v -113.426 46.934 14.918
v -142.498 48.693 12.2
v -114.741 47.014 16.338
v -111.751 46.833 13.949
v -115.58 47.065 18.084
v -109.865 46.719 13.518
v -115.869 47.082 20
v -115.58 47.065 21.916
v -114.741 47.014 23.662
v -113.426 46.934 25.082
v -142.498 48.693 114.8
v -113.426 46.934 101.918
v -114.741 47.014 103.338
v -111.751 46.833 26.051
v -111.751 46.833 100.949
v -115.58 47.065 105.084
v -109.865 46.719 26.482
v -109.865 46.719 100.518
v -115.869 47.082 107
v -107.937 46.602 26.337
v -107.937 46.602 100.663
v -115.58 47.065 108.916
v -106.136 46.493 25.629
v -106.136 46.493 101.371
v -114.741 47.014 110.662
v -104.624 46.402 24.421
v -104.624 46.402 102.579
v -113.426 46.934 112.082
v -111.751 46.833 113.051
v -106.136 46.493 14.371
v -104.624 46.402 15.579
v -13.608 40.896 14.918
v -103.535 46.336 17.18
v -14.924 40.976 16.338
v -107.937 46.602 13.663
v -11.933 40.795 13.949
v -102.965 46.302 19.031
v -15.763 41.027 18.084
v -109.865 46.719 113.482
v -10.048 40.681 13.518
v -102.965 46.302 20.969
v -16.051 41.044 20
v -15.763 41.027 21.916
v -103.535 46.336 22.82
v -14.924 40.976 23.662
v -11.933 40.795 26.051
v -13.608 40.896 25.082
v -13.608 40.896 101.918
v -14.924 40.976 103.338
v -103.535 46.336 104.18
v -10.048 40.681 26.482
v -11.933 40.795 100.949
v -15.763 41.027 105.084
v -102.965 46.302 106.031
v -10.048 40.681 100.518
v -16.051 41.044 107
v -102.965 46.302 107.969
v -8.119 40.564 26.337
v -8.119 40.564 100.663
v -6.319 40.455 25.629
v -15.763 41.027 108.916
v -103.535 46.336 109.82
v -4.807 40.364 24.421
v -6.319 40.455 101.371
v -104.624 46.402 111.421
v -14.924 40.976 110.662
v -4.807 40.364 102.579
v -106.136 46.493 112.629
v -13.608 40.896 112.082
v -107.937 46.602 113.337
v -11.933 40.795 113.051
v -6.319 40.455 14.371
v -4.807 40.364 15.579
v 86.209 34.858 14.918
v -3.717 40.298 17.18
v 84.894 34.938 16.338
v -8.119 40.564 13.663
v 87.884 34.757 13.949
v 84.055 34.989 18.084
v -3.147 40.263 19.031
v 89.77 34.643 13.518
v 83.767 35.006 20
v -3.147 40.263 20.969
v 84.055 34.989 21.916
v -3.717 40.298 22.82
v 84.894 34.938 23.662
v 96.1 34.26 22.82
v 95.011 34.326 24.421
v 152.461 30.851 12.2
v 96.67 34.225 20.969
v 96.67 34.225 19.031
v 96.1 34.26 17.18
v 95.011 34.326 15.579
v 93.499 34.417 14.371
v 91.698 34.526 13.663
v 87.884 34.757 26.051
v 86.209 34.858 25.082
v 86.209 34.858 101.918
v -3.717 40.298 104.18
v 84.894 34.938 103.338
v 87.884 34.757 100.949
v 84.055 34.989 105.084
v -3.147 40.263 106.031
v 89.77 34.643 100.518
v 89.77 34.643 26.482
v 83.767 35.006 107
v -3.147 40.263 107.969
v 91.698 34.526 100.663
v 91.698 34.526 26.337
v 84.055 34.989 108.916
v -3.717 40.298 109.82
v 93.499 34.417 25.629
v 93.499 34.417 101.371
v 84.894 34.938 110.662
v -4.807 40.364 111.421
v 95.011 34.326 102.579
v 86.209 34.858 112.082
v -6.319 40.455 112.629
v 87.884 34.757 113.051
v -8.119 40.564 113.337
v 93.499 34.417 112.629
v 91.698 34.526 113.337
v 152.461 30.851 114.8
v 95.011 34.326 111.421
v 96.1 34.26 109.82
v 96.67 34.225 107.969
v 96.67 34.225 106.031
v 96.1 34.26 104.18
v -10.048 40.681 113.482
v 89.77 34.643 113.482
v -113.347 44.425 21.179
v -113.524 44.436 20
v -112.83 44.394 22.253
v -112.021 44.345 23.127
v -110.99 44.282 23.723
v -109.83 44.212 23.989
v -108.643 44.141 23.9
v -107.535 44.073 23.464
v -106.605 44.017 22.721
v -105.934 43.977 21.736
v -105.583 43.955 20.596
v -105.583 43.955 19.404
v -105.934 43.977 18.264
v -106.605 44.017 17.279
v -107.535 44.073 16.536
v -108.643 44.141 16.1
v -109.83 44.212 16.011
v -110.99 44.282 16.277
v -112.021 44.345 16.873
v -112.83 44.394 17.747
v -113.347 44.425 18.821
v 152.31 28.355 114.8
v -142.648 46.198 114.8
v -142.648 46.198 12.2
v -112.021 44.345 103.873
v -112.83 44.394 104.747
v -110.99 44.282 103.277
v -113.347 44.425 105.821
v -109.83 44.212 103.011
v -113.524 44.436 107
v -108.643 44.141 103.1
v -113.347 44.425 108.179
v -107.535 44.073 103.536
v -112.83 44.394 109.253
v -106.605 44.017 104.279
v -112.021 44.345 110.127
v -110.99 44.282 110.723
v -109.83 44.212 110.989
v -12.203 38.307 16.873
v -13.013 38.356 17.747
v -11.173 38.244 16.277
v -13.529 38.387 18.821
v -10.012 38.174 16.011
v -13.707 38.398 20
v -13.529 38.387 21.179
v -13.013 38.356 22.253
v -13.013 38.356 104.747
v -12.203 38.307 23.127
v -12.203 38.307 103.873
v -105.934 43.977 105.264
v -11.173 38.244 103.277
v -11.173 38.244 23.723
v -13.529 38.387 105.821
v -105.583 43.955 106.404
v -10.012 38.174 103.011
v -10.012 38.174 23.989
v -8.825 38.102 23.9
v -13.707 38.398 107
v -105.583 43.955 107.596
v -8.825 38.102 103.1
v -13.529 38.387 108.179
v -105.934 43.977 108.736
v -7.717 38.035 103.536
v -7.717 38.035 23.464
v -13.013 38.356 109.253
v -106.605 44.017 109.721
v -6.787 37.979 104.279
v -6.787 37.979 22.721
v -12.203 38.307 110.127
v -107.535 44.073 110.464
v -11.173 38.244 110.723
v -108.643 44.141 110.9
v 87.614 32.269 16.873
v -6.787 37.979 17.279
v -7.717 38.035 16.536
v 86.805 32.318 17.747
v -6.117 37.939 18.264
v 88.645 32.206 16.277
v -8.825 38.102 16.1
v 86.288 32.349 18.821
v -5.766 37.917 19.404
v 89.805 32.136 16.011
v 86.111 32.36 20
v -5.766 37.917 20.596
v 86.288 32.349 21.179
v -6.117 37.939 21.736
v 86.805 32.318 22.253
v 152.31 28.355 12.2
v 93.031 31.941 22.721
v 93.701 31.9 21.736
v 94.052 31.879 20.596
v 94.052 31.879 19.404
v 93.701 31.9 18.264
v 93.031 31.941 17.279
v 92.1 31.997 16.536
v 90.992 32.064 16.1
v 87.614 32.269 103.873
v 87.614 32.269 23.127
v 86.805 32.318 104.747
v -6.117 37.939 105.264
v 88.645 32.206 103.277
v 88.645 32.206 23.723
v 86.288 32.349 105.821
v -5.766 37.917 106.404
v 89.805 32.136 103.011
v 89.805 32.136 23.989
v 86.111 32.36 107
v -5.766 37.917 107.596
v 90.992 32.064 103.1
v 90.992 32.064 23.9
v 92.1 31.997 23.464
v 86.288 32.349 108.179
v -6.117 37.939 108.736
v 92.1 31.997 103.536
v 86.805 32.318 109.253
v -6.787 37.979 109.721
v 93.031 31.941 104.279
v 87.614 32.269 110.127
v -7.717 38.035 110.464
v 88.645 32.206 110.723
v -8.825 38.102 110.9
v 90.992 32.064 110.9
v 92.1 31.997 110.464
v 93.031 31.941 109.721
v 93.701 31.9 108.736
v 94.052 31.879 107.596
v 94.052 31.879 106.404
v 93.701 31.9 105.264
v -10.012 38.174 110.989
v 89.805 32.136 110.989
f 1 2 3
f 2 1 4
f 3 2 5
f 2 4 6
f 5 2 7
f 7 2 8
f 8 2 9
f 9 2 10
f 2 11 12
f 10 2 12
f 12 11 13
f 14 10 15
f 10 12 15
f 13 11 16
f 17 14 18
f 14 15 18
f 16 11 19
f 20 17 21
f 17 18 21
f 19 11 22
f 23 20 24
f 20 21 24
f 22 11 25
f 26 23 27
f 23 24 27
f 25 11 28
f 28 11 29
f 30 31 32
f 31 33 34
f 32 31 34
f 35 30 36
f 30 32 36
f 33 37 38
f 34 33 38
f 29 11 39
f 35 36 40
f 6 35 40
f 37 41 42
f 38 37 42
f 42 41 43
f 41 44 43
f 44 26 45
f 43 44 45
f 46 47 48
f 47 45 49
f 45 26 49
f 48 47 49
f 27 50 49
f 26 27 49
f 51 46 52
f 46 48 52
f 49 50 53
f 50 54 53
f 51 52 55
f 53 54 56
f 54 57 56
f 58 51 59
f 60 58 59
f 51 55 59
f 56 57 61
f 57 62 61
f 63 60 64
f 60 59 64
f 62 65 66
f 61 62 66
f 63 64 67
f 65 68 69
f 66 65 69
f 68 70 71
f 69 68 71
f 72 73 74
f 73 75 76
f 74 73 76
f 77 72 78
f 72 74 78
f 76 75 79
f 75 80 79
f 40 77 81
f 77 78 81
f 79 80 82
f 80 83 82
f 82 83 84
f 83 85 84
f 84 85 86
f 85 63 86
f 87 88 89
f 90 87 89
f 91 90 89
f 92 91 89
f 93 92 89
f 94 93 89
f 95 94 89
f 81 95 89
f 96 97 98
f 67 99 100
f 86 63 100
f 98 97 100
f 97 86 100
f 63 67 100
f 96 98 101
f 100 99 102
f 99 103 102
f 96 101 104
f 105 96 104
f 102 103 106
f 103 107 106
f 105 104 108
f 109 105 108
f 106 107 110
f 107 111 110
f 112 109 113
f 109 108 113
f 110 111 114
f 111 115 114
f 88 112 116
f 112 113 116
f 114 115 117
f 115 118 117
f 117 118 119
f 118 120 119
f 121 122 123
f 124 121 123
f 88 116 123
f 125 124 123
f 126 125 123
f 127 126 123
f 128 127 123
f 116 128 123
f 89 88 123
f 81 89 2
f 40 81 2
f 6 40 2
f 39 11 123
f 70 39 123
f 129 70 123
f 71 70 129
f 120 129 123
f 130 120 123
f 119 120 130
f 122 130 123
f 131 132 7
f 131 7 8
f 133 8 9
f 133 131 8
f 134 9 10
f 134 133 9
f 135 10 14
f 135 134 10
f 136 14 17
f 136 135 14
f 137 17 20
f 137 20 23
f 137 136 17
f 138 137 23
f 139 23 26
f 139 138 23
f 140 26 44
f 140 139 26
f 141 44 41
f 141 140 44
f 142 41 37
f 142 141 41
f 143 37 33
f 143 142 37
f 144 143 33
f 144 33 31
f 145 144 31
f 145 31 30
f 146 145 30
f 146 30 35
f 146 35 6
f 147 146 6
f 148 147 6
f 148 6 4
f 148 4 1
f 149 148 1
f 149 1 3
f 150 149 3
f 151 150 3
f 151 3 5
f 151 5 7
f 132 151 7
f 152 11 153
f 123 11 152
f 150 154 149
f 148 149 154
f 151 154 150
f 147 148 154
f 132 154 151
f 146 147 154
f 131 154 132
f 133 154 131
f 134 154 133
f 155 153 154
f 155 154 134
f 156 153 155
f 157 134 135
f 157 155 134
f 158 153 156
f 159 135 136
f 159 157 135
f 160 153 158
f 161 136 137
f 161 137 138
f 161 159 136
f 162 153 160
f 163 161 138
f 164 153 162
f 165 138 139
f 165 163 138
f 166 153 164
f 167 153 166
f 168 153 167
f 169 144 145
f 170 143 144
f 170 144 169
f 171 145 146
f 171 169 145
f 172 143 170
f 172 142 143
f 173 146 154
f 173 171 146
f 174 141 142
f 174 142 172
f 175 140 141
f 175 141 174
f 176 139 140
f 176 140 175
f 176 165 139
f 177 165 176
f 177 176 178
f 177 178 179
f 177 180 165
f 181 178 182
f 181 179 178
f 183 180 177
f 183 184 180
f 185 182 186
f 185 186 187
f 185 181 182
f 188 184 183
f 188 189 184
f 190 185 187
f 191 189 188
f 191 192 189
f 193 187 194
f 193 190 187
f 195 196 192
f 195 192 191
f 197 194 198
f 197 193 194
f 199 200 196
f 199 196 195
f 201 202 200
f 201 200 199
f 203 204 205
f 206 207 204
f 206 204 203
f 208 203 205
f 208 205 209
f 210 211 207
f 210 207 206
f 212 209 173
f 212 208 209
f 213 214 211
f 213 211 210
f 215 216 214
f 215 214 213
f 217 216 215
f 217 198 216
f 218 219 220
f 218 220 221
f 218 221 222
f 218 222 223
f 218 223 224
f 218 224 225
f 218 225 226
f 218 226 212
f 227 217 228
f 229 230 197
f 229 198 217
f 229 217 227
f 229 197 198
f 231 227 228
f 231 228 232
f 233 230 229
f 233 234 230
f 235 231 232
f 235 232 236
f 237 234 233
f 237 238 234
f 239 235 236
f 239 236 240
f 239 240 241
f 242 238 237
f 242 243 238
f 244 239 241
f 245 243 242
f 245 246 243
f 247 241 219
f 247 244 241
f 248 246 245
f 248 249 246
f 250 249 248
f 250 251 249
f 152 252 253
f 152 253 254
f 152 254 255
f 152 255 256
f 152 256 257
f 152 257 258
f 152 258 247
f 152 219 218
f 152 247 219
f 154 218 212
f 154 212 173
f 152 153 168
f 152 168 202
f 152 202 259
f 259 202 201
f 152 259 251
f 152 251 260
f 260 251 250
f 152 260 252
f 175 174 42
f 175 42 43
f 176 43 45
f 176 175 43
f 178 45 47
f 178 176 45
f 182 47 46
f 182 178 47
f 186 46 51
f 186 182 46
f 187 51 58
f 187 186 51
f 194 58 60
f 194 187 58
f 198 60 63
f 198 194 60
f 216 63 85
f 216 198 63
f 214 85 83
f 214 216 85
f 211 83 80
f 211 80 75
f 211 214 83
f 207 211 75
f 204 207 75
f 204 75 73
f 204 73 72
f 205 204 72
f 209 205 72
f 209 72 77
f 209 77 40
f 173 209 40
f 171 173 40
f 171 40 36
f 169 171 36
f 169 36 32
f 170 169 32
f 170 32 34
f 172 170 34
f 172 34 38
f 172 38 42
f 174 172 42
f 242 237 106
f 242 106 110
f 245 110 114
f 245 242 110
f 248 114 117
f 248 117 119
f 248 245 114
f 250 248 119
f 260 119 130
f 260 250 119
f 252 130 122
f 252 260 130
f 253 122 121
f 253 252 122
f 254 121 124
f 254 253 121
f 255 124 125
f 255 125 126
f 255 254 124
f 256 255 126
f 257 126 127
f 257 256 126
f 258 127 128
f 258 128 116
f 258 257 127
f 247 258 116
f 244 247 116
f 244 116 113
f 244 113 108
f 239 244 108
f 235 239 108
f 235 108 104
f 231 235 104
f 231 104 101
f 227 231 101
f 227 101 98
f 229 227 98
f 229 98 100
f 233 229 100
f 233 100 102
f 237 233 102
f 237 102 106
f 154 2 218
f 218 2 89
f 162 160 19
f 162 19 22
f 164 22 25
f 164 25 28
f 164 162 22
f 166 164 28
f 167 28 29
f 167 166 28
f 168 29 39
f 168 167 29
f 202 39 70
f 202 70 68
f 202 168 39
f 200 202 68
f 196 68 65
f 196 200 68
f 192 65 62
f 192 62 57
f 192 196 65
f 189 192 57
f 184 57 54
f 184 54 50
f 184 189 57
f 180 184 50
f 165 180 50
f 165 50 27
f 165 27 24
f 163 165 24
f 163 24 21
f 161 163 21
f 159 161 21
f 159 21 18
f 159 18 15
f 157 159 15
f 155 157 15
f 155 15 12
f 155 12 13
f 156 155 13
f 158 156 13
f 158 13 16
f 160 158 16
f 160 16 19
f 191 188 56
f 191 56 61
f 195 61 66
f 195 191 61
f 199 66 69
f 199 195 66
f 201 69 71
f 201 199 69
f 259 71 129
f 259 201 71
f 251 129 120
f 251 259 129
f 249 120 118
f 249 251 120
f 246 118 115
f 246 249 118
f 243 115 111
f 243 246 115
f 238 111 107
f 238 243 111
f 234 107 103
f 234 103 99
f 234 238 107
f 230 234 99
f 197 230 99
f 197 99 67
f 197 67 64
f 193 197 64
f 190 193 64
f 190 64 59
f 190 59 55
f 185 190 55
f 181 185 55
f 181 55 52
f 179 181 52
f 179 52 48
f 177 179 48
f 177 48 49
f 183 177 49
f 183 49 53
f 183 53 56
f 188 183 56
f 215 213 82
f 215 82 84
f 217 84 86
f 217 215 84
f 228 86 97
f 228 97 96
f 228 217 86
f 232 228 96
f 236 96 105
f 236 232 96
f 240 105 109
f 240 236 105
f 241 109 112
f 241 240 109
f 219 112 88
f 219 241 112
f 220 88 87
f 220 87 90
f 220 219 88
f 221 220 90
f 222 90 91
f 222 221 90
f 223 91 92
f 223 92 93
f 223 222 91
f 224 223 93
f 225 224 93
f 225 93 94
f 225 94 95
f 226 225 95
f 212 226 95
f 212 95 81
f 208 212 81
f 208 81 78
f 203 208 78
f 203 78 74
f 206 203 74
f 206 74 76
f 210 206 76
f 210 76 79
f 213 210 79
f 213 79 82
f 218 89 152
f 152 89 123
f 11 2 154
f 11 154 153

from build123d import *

# Parameters (mm, degrees)
SKETCH005_W      = 295.497289
SKETCH005_H      = 102.6
SKETCH005_R      = 3.5
PAD005_DEPTH     = 2.5
HOLE_D           = 4.5
HOLE_DEPTH       = 25
HOLE_CSINK_D     = 13
HOLE_CSINK_ANGLE = 90


with BuildPart() as belt_backing_plate:
    # Sketch005 (on DatumPlane) → Pad005 (new body)
    with BuildSketch(Plane(origin=(2.415223, -39.927017, 0), x_dir=(0.998175, 0.060381, 0), z_dir=(0.060381, -0.998175, 0))):
        with Locations((2.570994, 63.5)):
            Rectangle(SKETCH005_W, SKETCH005_H)
        with Locations((-112, 107)):
            Circle(SKETCH005_R, mode=Mode.SUBTRACT)
        with Locations((-12, 107)):
            Circle(SKETCH005_R, mode=Mode.SUBTRACT)
        with Locations((88, 107)):
            Circle(SKETCH005_R, mode=Mode.SUBTRACT)
        with Locations((-112, 20)):
            Circle(SKETCH005_R, mode=Mode.SUBTRACT)
        with Locations((-12, 20)):
            Circle(SKETCH005_R, mode=Mode.SUBTRACT)
        with Locations((88, 20)):
            Circle(SKETCH005_R, mode=Mode.SUBTRACT)
    extrude(amount=-PAD005_DEPTH)

    # Hole
    with Locations(Plane(origin=(2.415223, -39.927017, 0), x_dir=(0.998175, 0.060381, 0), z_dir=(0.060381, -0.998175, 0))):
        with Locations((-112, 107), (-12, 107), (88, 107), (-112, 20), (-12, 20), (88, 20)):
            CounterSinkHole(HOLE_D / 2, HOLE_CSINK_D / 2, depth=HOLE_DEPTH, counter_sink_angle=HOLE_CSINK_ANGLE)


with BuildPart() as part_mirroring:
    # Part__Mirroring: instance of Belt backing plate
    add(belt_backing_plate.part.mirror(Plane(origin=(0, 0, 0), x_dir=(-1, 0, 0), z_dir=(0, -1, 0))))


solid = part_mirroring.part
